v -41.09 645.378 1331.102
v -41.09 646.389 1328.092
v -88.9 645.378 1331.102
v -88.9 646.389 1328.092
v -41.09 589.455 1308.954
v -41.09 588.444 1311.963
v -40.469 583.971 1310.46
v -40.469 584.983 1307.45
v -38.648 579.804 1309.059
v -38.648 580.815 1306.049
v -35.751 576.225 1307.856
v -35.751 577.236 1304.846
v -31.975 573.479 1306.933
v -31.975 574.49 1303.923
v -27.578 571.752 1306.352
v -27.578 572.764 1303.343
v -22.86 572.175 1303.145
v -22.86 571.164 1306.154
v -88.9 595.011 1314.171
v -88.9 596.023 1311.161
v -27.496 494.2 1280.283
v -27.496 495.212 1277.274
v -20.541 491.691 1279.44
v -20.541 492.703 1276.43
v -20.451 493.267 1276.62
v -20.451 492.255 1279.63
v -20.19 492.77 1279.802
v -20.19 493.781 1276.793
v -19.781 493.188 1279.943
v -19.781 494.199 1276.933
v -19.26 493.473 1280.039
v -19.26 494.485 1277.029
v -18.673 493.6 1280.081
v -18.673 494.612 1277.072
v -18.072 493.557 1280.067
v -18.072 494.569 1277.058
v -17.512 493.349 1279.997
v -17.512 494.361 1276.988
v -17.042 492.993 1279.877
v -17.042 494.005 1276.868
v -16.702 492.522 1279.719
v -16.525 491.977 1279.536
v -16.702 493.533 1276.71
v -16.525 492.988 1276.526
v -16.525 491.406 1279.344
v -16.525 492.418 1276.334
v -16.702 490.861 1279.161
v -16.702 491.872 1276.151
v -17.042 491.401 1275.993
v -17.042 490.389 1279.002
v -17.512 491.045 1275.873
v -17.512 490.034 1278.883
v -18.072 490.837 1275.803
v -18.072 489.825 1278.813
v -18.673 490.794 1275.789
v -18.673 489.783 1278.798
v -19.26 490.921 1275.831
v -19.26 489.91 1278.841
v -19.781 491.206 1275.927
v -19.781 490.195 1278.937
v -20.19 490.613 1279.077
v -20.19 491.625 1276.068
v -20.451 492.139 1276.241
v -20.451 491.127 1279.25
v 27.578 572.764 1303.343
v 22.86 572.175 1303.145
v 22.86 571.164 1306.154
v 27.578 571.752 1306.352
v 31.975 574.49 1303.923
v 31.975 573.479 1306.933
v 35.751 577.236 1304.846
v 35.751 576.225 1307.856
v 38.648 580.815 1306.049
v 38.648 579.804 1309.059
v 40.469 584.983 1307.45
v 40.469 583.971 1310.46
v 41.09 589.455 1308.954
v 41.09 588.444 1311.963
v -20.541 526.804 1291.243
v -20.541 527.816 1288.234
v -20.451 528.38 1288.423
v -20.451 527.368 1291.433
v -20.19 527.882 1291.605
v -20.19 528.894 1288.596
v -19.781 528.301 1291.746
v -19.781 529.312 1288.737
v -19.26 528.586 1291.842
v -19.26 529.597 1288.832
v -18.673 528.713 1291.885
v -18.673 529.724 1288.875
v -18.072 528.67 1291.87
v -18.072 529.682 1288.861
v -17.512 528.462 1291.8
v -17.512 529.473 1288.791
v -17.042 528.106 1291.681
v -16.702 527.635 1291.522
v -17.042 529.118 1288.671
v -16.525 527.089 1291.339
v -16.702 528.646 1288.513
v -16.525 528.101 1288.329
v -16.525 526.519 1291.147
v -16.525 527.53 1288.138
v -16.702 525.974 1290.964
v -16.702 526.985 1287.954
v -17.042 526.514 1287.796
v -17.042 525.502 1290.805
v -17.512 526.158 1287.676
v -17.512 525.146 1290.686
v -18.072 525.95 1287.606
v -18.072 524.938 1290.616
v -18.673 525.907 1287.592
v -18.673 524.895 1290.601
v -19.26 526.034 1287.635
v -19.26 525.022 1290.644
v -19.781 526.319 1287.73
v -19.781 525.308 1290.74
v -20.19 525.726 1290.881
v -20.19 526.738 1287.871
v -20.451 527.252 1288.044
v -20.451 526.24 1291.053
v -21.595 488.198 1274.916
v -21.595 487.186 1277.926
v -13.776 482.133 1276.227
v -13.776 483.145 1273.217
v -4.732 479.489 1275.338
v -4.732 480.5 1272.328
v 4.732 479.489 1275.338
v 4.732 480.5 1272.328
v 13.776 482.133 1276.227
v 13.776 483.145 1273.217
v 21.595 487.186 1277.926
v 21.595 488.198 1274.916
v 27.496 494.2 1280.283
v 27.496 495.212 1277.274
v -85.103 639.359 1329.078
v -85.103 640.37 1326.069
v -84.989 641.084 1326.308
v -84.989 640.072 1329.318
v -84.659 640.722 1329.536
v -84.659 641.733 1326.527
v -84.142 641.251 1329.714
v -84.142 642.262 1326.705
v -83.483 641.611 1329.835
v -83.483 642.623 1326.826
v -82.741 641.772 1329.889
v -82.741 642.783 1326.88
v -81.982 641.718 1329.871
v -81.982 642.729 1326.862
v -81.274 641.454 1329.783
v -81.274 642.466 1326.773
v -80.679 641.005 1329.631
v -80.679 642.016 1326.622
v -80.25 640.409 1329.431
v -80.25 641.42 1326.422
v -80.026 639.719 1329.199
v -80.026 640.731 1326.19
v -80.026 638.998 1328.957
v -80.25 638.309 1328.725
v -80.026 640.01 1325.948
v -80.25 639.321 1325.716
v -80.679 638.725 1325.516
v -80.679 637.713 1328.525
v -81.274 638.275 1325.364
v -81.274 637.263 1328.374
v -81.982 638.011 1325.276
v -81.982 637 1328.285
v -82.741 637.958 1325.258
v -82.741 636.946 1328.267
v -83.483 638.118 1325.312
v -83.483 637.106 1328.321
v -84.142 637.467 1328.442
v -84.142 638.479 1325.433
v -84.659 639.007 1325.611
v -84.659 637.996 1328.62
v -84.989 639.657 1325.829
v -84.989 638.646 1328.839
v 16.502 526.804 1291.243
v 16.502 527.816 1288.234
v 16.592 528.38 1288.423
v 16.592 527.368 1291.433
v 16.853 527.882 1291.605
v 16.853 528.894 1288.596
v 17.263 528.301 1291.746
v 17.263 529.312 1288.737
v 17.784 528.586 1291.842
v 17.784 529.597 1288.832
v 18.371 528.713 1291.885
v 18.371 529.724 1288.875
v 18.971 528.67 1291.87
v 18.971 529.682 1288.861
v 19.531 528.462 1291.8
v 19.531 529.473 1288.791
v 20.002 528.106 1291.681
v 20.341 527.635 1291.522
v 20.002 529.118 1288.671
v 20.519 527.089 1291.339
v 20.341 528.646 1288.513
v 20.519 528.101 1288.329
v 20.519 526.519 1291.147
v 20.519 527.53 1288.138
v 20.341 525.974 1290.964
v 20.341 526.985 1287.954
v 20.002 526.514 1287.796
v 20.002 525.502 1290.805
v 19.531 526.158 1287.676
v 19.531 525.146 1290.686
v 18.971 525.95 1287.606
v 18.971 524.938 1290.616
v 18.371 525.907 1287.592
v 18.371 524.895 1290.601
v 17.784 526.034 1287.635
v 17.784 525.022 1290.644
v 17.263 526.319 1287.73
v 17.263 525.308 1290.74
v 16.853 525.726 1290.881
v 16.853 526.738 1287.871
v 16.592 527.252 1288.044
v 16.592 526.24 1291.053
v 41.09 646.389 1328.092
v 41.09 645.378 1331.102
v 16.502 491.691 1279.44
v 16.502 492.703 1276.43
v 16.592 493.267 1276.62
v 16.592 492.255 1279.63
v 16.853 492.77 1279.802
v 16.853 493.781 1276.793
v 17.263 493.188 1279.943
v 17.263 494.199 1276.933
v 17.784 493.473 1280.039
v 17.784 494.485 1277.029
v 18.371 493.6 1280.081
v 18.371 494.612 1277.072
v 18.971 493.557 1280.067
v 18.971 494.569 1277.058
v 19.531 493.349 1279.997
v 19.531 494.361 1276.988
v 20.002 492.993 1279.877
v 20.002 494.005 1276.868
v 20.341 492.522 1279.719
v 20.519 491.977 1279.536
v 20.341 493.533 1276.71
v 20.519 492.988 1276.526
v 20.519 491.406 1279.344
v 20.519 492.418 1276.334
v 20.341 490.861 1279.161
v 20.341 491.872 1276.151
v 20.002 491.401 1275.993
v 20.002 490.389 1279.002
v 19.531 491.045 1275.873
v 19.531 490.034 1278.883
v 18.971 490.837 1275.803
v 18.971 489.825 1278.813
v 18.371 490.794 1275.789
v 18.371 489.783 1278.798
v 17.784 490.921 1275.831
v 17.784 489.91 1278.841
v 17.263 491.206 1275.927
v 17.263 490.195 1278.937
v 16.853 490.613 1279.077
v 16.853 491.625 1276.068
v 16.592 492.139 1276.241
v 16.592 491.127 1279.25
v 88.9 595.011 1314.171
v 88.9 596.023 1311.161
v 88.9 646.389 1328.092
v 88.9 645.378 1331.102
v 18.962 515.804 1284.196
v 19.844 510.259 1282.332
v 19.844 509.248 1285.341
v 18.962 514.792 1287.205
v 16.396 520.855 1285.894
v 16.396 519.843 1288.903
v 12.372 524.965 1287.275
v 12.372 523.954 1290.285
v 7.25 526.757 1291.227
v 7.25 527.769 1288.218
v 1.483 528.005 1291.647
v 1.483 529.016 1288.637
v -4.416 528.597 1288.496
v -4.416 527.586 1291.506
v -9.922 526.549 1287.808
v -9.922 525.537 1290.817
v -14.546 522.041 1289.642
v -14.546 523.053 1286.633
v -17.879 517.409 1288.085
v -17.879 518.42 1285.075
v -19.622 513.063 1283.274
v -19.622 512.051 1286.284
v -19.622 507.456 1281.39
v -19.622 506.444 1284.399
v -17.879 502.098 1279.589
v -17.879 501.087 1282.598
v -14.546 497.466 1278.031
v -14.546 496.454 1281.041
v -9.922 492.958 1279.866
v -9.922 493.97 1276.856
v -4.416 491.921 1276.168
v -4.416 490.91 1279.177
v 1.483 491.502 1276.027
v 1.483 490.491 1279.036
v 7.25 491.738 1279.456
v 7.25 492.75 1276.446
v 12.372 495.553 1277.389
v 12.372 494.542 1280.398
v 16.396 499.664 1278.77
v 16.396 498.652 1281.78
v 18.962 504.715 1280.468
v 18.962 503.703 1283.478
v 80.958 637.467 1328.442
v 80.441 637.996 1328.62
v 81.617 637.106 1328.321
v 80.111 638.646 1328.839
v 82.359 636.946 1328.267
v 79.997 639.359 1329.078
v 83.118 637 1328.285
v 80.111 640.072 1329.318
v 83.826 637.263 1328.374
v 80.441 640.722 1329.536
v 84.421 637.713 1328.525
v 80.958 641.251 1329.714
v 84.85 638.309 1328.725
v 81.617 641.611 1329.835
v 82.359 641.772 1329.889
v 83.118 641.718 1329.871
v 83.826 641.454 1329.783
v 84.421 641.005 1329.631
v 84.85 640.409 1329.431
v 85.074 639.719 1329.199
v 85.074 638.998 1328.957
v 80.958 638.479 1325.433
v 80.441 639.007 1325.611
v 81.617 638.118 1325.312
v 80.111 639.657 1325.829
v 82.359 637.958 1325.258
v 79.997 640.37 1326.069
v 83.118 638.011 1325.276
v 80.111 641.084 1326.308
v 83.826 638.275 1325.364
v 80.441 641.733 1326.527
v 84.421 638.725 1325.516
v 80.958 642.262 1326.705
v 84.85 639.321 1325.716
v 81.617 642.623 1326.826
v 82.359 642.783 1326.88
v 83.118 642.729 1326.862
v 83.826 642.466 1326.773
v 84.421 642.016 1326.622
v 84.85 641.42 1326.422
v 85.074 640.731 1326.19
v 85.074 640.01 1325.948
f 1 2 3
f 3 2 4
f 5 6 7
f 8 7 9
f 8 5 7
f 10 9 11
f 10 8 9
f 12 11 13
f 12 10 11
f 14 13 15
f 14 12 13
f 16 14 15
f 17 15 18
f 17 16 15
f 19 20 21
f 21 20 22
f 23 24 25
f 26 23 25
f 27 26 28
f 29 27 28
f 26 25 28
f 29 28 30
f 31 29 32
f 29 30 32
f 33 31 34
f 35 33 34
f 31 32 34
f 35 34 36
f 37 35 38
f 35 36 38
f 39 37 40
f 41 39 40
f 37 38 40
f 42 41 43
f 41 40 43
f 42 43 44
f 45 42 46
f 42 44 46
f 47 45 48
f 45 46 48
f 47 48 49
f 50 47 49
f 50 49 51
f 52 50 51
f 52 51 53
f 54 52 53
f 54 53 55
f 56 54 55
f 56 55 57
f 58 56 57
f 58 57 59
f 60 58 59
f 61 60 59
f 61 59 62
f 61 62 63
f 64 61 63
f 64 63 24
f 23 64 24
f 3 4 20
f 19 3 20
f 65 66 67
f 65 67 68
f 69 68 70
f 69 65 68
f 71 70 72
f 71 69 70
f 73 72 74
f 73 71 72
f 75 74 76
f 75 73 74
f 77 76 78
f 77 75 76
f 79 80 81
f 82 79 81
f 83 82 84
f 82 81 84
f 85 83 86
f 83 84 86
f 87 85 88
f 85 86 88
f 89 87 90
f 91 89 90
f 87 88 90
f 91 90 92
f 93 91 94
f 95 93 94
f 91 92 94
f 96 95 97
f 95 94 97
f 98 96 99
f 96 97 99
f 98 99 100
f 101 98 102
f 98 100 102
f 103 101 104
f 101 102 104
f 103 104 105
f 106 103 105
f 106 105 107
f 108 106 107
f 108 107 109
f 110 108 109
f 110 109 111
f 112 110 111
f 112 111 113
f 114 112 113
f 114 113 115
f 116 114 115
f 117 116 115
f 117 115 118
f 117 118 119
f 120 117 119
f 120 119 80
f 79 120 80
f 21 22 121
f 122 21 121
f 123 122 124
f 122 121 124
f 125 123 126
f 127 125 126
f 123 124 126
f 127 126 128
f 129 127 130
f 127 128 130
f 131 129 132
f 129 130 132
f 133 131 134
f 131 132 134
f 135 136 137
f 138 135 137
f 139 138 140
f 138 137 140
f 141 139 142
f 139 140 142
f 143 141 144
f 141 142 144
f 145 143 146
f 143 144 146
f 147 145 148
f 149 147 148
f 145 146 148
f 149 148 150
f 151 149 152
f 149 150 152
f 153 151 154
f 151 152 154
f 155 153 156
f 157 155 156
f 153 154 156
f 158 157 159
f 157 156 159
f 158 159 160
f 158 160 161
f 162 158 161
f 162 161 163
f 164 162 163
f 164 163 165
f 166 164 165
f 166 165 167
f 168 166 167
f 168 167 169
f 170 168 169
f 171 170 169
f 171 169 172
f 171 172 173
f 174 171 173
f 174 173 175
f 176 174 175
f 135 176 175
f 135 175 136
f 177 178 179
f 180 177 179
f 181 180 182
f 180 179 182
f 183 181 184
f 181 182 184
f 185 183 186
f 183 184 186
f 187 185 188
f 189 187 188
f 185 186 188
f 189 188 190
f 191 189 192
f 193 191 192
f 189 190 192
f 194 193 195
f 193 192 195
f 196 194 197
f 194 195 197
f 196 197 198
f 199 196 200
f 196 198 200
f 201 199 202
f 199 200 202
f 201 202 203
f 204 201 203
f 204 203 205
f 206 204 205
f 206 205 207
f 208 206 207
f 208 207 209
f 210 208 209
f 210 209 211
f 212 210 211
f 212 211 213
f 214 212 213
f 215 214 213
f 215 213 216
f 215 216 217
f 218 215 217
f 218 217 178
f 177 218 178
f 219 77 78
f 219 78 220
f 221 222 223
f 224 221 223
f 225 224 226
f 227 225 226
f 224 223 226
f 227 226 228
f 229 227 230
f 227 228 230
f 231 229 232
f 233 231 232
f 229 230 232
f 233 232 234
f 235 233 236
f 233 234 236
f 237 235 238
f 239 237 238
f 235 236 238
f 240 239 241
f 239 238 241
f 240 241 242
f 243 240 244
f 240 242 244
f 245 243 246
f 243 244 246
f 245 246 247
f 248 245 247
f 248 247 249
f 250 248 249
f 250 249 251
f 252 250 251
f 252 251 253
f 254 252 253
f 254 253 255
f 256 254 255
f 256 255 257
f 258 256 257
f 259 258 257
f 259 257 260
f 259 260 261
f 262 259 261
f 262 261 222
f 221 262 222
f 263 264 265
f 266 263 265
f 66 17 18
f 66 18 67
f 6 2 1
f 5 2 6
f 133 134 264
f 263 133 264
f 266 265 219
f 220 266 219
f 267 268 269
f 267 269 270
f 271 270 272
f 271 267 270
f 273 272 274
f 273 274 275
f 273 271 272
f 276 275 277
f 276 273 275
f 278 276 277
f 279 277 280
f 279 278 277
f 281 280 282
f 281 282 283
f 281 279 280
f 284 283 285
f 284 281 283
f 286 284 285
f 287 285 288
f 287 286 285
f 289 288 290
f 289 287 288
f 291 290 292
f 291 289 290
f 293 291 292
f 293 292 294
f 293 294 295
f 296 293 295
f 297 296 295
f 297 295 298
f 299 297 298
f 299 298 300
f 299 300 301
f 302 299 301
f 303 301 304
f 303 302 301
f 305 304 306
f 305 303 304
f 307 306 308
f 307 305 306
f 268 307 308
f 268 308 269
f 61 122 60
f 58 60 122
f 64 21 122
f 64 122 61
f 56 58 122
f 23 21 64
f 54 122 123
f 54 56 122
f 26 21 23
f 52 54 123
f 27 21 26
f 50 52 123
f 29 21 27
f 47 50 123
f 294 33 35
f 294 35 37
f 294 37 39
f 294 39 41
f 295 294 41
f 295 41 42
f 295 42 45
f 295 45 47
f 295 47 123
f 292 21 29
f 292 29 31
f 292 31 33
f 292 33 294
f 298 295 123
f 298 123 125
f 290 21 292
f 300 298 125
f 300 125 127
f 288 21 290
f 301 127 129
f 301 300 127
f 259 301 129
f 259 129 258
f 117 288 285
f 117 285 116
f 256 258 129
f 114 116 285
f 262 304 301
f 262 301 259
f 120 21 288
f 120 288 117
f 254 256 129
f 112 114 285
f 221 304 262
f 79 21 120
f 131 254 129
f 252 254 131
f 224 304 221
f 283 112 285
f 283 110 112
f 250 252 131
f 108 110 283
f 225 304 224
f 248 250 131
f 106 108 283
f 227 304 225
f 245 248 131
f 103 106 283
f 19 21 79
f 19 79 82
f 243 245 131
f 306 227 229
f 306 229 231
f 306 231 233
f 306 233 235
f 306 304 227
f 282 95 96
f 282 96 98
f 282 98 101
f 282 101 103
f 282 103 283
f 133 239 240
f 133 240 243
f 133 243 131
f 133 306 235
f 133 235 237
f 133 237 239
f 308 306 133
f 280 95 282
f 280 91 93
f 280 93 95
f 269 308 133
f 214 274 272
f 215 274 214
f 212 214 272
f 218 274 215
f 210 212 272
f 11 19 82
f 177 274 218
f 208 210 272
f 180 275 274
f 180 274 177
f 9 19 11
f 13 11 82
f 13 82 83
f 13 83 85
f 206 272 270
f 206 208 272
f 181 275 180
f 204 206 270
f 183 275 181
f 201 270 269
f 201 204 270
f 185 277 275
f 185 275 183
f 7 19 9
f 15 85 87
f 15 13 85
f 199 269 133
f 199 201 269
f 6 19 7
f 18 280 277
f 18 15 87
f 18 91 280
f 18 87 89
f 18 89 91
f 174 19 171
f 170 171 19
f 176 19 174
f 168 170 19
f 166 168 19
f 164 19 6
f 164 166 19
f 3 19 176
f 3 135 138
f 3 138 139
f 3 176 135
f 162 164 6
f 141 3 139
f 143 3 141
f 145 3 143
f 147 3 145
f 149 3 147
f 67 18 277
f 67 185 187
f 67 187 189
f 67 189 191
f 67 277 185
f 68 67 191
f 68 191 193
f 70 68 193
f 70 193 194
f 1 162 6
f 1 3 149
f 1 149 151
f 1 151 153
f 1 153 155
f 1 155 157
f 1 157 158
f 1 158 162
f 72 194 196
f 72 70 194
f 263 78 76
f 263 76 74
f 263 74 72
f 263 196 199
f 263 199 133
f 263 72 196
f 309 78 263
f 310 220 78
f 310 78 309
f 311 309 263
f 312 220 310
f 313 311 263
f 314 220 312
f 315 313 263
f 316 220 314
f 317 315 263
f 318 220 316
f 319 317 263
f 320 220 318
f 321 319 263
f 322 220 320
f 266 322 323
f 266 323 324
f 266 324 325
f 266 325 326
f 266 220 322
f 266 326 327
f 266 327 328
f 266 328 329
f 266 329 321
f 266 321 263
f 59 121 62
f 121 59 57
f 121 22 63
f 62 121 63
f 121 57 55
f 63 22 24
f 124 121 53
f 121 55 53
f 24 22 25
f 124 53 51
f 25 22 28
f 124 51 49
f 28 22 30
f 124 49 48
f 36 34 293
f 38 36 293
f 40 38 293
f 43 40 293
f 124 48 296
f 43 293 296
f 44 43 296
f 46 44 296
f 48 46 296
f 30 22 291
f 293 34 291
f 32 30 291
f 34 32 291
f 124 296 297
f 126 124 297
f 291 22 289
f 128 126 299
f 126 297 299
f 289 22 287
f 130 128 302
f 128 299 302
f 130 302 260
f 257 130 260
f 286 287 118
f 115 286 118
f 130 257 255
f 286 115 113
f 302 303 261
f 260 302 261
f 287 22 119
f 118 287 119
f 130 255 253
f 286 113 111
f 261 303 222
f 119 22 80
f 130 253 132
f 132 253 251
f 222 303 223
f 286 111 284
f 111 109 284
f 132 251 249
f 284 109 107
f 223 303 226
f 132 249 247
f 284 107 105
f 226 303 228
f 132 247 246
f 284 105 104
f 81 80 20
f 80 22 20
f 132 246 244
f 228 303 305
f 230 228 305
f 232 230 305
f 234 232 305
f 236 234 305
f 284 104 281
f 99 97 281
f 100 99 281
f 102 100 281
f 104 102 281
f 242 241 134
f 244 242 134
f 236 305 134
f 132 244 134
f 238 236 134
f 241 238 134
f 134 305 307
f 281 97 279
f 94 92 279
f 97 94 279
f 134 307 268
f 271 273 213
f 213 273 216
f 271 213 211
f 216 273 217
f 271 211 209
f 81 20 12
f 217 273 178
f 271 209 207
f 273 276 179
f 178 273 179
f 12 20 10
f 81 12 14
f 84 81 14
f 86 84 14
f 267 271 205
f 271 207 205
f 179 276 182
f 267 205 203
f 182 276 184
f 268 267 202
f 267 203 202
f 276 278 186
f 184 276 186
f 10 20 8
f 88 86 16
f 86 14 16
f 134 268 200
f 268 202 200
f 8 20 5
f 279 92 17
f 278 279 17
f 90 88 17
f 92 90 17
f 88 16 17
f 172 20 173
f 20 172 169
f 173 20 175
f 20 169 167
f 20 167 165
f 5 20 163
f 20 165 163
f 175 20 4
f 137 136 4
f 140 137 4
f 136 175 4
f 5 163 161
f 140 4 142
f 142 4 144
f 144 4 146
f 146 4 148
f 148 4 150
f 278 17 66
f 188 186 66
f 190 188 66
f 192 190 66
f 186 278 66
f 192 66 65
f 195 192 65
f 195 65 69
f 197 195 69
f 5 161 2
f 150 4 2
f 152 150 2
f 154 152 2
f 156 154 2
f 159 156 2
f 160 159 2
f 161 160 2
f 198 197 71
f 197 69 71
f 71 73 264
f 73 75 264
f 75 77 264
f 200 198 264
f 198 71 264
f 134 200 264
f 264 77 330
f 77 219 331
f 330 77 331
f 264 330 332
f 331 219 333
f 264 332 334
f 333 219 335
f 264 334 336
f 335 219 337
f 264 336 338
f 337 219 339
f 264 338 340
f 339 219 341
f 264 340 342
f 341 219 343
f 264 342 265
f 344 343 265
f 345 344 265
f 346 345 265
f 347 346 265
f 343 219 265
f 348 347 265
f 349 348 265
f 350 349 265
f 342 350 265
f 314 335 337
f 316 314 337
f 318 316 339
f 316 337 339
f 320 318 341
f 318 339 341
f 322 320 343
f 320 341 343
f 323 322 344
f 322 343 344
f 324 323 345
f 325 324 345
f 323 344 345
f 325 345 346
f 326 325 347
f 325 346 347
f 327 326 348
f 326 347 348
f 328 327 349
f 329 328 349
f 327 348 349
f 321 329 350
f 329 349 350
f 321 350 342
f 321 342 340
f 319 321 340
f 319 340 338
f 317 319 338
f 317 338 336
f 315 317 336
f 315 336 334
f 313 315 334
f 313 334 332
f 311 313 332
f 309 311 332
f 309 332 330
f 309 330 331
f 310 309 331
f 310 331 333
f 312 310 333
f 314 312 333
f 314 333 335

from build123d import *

# Parameters (mm, degrees)
SKETCH1_R               = 19.84375
BOSS_EXTRUDE1_DEPTH     = 3.175
F_1_4_20_TAPPED_HOLE1_D = 5.1054
F_10_32_TAPPED_HOLE1_D  = 4.0386
CUT_EXTRUDE1_DEPTH      = 57.13926808


with BuildPart() as part:
    # Sketch1 → Boss-Extrude1 (new body)
    with BuildSketch(Plane(origin=(0, -335.48880086, 998.033966912), x_dir=(1, 0, 0), z_dir=(0, -0.318629355, 0.947879388))):
        with BuildLine():
            Line((-88.9, 1035.868385599), (-88.9, 982.73222125))
            Line((-88.9, 982.73222125), (-27.49630657, 876.377904457))
            ThreePointArc((-27.49630657, 876.377904457), (0, 860.502904457), (27.49630657, 876.377904457))
            Line((27.49630657, 876.377904457), (88.9, 982.73222125))
            Line((88.9, 982.73222125), (88.9, 1035.868385599))
            Line((88.9, 1035.868385599), (-88.9, 1035.868385599))
        make_face()
        with Locations((0, 892.252904457)):
            Circle(SKETCH1_R, mode=Mode.SUBTRACT)
    extrude(amount=BOSS_EXTRUDE1_DEPTH)

    # 1/4-20 Tapped Hole1 (through all)
    with Locations(Plane(origin=(0, -336.500449063, 1001.043483969), x_dir=(1, 0, 0), z_dir=(0, -0.318629355, 0.947879388))):
        with Locations((82.55, 1029.518385599), (-82.55, 1029.518385599)):
            Hole(F_1_4_20_TAPPED_HOLE1_D / 2)

    # #10-32 Tapped Hole1 (through all)
    with Locations(Plane(origin=(0, -336.500449063, 1001.043483969), x_dir=(1, 0, 0), z_dir=(0, -0.318629355, 0.947879388))):
        with Locations((18.52177825, 873.731126207), (-18.52177825, 873.731126207), (-18.52177825, 910.774682707), (18.52177825, 910.774682707)):
            Hole(F_10_32_TAPPED_HOLE1_D / 2)

    # Sketch6 → Cut-Extrude1 (cut, through all)
    with BuildSketch(Plane(origin=(0, -335.48880086, 998.033966912), x_dir=(-1, 0, 0), z_dir=(0, 0.318629355, -0.947879388))):
        with BuildLine():
            Line((-41.090457195, 975.803721018), (-41.090457195, 1046.47326385))
            Line((-41.090457195, 1046.47326385), (41.0904572, 1046.47326385))
            Line((41.0904572, 1046.47326385), (41.090457191, 975.803721018))
            ThreePointArc((41.090457191, 975.803721018), (35.75087991, 962.91284113), (22.860000022, 957.57326385))
            Line((22.860000022, 957.57326385), (-22.860000028, 957.57326385))
            ThreePointArc((-22.860000028, 957.57326385), (-35.750879915, 962.91284113), (-41.090457195, 975.803721018))
        make_face()
    extrude(amount=-CUT_EXTRUDE1_DEPTH, mode=Mode.SUBTRACT)


solid = part.part
